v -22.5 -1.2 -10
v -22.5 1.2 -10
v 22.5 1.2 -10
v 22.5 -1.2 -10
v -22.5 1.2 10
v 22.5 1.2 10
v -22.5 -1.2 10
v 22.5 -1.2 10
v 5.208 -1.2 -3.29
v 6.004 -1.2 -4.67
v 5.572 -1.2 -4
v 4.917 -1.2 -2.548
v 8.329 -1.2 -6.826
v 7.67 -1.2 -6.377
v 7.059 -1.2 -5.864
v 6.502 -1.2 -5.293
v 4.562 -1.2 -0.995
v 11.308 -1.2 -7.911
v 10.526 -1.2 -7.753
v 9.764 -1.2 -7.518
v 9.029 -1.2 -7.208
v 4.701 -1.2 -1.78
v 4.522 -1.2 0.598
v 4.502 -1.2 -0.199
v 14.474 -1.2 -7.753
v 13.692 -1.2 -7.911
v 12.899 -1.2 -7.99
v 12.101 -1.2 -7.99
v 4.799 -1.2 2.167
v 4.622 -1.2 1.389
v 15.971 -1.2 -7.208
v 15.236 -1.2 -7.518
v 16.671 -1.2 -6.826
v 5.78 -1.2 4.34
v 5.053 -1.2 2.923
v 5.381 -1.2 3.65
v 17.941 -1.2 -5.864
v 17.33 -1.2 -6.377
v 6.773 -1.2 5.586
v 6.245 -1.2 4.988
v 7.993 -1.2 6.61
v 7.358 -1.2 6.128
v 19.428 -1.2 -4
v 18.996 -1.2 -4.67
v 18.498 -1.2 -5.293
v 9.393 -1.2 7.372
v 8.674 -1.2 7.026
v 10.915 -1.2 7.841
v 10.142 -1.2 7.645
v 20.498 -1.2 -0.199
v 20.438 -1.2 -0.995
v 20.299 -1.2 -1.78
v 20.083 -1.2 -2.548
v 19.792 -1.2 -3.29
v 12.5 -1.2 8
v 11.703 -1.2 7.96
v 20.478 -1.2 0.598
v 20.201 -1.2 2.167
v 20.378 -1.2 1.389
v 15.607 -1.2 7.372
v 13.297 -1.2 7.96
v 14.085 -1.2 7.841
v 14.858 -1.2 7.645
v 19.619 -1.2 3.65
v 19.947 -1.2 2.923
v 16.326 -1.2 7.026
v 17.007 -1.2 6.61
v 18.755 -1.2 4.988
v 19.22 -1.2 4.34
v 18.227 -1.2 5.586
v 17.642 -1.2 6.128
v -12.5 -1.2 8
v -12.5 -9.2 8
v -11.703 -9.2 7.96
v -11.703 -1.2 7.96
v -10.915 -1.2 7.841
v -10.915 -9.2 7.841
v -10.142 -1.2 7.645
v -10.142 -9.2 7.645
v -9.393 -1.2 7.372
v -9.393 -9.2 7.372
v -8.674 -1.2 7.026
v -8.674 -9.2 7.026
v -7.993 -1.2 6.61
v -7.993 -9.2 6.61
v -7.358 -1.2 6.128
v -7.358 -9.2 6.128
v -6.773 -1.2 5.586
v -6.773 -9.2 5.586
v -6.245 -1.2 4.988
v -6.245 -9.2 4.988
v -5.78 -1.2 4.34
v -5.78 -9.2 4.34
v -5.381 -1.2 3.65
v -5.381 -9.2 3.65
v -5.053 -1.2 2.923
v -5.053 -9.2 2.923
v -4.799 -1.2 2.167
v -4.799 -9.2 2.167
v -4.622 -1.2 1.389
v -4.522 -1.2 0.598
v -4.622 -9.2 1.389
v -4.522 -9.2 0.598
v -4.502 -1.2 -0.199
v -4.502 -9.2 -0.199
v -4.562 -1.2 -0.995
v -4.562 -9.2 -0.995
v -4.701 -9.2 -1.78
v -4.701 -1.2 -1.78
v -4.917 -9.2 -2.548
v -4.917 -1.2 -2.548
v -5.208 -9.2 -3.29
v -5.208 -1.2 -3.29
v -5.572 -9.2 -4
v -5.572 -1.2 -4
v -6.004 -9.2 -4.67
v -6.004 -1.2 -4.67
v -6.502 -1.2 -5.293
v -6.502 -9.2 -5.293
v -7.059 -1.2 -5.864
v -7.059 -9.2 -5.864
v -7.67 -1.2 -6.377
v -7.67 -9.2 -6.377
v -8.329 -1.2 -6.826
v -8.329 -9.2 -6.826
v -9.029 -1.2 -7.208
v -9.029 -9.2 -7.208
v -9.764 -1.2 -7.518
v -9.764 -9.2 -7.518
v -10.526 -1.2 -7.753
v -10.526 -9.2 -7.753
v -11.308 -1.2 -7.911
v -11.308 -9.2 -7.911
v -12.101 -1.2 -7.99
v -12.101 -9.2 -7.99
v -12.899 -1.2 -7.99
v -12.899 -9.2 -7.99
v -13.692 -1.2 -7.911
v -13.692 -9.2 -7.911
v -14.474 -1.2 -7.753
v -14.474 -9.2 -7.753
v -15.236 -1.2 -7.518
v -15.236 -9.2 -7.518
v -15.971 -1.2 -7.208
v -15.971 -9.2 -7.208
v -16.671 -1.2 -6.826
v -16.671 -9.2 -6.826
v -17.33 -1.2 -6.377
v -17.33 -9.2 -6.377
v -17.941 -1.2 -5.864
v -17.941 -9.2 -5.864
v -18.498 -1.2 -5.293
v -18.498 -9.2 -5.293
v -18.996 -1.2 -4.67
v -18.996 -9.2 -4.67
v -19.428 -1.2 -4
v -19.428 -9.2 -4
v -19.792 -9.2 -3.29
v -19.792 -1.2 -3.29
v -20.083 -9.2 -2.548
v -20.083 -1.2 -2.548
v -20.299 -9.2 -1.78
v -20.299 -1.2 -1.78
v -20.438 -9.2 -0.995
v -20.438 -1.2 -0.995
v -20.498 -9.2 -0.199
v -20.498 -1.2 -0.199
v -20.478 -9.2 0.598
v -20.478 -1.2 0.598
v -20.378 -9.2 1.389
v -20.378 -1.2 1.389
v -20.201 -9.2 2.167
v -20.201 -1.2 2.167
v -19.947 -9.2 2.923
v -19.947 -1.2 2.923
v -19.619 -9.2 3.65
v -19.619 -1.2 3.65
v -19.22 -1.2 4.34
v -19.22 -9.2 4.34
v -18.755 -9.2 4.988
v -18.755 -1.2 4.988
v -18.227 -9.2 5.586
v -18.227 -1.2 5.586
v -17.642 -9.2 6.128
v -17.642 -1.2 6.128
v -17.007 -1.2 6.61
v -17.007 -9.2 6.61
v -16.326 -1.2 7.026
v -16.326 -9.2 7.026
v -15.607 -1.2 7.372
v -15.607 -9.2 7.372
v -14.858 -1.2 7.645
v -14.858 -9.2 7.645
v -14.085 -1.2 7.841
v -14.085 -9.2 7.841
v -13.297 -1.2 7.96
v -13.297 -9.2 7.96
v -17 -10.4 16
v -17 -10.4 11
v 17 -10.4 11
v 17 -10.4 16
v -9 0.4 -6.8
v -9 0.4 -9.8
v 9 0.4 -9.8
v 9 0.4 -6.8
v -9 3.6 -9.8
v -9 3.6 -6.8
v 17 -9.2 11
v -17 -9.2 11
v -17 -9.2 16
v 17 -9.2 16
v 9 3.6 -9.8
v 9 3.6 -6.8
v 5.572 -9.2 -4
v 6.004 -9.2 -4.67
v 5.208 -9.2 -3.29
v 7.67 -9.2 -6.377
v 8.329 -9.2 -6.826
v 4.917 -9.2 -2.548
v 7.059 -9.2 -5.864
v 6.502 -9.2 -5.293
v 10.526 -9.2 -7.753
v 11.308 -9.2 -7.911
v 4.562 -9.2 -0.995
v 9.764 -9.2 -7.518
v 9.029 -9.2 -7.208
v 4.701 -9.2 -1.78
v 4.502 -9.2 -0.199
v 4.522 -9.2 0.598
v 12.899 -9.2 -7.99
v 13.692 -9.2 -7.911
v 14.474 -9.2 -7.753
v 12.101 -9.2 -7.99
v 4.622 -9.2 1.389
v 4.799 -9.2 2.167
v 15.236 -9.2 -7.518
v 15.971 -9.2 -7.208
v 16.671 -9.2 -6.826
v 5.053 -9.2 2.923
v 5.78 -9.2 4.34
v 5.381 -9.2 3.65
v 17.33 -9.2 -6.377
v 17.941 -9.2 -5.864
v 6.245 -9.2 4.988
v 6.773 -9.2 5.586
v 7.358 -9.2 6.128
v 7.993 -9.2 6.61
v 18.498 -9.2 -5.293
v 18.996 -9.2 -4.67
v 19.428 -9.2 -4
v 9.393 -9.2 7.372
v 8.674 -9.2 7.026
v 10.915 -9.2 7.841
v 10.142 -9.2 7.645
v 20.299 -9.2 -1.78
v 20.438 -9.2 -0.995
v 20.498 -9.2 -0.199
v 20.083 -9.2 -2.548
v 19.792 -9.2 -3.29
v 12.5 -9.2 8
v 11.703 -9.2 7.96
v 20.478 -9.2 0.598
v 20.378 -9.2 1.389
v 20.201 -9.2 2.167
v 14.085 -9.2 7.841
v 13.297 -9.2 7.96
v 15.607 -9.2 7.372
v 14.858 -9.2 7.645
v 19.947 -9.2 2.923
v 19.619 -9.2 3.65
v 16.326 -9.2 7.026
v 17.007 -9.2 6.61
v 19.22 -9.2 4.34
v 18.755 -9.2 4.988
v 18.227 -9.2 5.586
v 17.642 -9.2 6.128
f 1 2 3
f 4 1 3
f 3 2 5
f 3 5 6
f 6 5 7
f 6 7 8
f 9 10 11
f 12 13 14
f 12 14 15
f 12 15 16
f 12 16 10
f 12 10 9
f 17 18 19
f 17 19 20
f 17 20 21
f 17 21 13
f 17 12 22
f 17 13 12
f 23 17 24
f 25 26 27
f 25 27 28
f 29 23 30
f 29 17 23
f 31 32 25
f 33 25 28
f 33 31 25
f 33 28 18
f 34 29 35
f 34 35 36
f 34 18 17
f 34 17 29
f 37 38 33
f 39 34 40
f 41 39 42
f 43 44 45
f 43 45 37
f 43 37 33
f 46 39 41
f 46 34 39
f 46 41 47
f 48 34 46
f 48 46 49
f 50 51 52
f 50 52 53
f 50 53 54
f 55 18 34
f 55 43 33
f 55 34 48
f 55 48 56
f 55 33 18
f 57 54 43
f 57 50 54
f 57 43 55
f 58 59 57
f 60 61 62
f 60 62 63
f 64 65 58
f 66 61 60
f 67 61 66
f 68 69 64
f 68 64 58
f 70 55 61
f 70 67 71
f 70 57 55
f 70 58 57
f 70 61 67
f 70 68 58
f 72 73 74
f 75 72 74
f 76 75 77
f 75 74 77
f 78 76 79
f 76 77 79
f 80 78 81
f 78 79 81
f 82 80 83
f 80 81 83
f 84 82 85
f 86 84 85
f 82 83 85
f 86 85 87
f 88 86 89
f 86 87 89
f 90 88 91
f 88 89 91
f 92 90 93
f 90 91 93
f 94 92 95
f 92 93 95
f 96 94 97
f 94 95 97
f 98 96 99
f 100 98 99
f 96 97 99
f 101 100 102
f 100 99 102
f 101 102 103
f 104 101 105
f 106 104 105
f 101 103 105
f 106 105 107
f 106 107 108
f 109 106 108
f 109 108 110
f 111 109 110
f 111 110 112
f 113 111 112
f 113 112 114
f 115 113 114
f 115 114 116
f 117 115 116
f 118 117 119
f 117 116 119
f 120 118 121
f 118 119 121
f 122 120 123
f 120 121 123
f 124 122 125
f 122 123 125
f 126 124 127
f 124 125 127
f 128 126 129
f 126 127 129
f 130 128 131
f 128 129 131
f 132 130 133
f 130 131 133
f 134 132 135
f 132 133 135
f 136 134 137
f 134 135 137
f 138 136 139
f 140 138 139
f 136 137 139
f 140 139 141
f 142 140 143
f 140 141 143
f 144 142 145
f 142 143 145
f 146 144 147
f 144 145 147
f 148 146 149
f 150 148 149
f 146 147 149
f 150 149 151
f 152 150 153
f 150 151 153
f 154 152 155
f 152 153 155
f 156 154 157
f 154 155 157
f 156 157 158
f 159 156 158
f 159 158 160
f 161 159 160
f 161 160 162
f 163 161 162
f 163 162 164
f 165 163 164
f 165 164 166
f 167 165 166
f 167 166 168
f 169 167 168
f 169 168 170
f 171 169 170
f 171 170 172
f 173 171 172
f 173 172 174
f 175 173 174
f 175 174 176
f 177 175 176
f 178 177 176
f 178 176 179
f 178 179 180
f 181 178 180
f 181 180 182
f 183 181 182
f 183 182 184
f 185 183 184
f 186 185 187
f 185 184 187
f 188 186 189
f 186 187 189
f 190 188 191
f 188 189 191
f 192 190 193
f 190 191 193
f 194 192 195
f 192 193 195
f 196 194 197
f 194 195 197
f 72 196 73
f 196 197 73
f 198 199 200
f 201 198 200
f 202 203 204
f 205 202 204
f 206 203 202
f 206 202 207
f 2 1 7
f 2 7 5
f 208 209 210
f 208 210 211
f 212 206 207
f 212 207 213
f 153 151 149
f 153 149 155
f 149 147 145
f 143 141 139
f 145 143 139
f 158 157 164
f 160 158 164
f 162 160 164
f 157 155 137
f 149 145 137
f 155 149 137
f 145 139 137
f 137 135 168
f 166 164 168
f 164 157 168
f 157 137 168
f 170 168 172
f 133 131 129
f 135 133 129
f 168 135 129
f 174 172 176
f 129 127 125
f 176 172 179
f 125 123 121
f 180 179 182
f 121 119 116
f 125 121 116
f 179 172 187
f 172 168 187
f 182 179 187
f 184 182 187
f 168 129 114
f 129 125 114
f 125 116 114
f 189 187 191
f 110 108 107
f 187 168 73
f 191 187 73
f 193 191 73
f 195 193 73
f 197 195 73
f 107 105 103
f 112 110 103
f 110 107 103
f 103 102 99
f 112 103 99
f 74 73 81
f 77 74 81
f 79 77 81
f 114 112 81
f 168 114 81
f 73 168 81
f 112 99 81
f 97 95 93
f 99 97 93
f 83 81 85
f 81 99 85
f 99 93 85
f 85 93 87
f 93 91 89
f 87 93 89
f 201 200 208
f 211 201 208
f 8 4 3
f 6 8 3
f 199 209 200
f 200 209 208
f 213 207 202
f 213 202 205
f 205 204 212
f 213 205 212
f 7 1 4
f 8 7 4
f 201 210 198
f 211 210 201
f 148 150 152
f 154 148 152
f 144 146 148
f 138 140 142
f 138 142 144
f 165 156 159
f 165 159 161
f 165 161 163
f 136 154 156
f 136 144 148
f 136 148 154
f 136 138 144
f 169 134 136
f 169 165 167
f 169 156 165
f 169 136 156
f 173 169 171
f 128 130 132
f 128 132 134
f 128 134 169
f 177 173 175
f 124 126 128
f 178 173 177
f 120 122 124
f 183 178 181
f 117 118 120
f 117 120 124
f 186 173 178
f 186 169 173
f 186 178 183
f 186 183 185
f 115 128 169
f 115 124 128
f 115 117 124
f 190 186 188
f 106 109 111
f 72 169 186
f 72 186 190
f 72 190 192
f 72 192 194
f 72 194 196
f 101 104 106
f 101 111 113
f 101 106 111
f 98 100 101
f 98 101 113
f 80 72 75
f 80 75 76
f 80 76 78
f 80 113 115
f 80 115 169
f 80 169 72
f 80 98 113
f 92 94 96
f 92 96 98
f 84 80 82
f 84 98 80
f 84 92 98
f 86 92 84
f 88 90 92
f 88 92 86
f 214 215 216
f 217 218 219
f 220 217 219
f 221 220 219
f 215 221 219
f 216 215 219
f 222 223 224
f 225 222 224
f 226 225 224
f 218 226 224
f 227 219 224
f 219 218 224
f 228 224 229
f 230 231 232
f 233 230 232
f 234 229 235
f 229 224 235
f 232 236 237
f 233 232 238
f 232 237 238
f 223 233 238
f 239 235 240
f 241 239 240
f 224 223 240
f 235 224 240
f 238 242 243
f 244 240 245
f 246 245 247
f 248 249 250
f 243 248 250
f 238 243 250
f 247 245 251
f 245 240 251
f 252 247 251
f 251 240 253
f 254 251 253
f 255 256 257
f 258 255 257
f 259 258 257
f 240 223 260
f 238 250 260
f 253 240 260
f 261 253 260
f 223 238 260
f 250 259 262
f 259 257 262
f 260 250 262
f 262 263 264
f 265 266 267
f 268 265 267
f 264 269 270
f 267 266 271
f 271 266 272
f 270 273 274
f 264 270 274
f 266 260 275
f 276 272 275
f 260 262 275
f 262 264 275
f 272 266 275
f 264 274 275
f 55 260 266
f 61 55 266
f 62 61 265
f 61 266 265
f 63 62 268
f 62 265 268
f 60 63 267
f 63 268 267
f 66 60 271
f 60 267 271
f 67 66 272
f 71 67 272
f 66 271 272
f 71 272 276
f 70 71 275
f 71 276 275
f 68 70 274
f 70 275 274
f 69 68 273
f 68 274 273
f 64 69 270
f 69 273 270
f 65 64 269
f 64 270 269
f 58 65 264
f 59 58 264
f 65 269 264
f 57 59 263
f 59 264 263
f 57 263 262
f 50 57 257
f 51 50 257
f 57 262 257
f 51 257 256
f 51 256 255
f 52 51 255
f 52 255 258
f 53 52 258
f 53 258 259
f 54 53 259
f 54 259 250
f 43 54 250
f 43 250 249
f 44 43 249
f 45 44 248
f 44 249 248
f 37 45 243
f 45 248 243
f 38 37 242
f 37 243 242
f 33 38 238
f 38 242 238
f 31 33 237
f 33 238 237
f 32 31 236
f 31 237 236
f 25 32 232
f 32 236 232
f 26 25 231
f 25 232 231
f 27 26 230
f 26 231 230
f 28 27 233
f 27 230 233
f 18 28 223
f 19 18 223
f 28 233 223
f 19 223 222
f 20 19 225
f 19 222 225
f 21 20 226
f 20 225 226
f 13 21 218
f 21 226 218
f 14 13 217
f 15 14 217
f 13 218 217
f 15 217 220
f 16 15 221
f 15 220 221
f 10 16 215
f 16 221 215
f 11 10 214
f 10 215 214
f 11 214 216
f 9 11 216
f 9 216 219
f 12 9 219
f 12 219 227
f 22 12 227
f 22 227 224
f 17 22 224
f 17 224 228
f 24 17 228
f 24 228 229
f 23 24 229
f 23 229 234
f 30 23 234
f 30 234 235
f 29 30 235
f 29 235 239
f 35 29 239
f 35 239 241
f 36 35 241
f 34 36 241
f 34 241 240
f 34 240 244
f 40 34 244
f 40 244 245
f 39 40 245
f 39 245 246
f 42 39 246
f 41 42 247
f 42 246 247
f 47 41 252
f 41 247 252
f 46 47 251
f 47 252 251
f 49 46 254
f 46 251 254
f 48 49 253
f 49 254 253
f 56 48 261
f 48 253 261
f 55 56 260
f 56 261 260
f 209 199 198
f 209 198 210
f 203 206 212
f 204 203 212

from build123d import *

# Parameters (mm, degrees)
HC_SR04_START                                = -10
SKETCH_1_W                                   = 45
SKETCH_1_H                                   = 2.4
HC_SR04_PCB_45_X_20_MM_DEPTH                 = 20
LEFT_START                                   = -9.2
SKETCH_2_R                                   = 8
LEFT_ULTRASONIC_TRANSDUCER_EYE_DIA_16_DEPTH  = 8
RIGHT_START                                  = -9.2
SKETCH_3_R                                   = 8
RIGHT_ULTRASONIC_TRANSDUCER_EYE_DIA_16_DEPTH = 8
F_4_START                                    = -9.8
SKETCH_4_W                                   = 18
SKETCH_4_H                                   = 3.2
F_4_PIN_HEADER_BLOCK_DEPTH                   = 3
SENSOR_START                                 = 11
SKETCH_5_W                                   = 34
SKETCH_5_H                                   = 1.2
SENSOR_LABEL_PLATE_HC_SR04_45X20_DEPTH       = 5


with BuildPart() as part:
    # 草图1 → HC-SR04 PCB - 45 x 20 mm (new body)
    with BuildSketch(Plane.XY.offset(HC_SR04_START)):
        Rectangle(SKETCH_1_W, SKETCH_1_H)
    extrude(amount=HC_SR04_PCB_45_X_20_MM_DEPTH)


with BuildPart() as body_2:
    # 草图2 → left ultrasonic transducer eye - dia 16 mm (new body)
    with BuildSketch(Plane(origin=(0, 0, 0), x_dir=(1, 0, 0), z_dir=(0, 1, 0)).offset(LEFT_START)):
        with Locations(Location((-12.5, 0, 0), (0, 0, 270))):
            Circle(SKETCH_2_R)
    extrude(amount=LEFT_ULTRASONIC_TRANSDUCER_EYE_DIA_16_DEPTH)


with BuildPart() as body_3:
    # 草图3 → right ultrasonic transducer eye - dia 16 mm (new body)
    with BuildSketch(Plane(origin=(0, 0, 0), x_dir=(1, 0, 0), z_dir=(0, 1, 0)).offset(RIGHT_START)):
        with Locations(Location((12.5, 0, 0), (0, 0, 270))):
            Circle(SKETCH_3_R)
    extrude(amount=RIGHT_ULTRASONIC_TRANSDUCER_EYE_DIA_16_DEPTH)


with BuildPart() as body_4:
    # 草图4 → 4 pin header block (new body)
    with BuildSketch(Plane.XY.offset(F_4_START)):
        with Locations((0, 2)):
            Rectangle(SKETCH_4_W, SKETCH_4_H)
    extrude(amount=F_4_PIN_HEADER_BLOCK_DEPTH)


with BuildPart() as body_5:
    # 草图5 → sensor label plate - HC-SR04 45x20 (new body)
    with BuildSketch(Plane.XY.offset(SENSOR_START)):
        with Locations((0, -9.8)):
            Rectangle(SKETCH_5_W, SKETCH_5_H)
    extrude(amount=SENSOR_LABEL_PLATE_HC_SR04_45X20_DEPTH)


solid = Compound([part.part, body_2.part, body_3.part, body_4.part, body_5.part])
